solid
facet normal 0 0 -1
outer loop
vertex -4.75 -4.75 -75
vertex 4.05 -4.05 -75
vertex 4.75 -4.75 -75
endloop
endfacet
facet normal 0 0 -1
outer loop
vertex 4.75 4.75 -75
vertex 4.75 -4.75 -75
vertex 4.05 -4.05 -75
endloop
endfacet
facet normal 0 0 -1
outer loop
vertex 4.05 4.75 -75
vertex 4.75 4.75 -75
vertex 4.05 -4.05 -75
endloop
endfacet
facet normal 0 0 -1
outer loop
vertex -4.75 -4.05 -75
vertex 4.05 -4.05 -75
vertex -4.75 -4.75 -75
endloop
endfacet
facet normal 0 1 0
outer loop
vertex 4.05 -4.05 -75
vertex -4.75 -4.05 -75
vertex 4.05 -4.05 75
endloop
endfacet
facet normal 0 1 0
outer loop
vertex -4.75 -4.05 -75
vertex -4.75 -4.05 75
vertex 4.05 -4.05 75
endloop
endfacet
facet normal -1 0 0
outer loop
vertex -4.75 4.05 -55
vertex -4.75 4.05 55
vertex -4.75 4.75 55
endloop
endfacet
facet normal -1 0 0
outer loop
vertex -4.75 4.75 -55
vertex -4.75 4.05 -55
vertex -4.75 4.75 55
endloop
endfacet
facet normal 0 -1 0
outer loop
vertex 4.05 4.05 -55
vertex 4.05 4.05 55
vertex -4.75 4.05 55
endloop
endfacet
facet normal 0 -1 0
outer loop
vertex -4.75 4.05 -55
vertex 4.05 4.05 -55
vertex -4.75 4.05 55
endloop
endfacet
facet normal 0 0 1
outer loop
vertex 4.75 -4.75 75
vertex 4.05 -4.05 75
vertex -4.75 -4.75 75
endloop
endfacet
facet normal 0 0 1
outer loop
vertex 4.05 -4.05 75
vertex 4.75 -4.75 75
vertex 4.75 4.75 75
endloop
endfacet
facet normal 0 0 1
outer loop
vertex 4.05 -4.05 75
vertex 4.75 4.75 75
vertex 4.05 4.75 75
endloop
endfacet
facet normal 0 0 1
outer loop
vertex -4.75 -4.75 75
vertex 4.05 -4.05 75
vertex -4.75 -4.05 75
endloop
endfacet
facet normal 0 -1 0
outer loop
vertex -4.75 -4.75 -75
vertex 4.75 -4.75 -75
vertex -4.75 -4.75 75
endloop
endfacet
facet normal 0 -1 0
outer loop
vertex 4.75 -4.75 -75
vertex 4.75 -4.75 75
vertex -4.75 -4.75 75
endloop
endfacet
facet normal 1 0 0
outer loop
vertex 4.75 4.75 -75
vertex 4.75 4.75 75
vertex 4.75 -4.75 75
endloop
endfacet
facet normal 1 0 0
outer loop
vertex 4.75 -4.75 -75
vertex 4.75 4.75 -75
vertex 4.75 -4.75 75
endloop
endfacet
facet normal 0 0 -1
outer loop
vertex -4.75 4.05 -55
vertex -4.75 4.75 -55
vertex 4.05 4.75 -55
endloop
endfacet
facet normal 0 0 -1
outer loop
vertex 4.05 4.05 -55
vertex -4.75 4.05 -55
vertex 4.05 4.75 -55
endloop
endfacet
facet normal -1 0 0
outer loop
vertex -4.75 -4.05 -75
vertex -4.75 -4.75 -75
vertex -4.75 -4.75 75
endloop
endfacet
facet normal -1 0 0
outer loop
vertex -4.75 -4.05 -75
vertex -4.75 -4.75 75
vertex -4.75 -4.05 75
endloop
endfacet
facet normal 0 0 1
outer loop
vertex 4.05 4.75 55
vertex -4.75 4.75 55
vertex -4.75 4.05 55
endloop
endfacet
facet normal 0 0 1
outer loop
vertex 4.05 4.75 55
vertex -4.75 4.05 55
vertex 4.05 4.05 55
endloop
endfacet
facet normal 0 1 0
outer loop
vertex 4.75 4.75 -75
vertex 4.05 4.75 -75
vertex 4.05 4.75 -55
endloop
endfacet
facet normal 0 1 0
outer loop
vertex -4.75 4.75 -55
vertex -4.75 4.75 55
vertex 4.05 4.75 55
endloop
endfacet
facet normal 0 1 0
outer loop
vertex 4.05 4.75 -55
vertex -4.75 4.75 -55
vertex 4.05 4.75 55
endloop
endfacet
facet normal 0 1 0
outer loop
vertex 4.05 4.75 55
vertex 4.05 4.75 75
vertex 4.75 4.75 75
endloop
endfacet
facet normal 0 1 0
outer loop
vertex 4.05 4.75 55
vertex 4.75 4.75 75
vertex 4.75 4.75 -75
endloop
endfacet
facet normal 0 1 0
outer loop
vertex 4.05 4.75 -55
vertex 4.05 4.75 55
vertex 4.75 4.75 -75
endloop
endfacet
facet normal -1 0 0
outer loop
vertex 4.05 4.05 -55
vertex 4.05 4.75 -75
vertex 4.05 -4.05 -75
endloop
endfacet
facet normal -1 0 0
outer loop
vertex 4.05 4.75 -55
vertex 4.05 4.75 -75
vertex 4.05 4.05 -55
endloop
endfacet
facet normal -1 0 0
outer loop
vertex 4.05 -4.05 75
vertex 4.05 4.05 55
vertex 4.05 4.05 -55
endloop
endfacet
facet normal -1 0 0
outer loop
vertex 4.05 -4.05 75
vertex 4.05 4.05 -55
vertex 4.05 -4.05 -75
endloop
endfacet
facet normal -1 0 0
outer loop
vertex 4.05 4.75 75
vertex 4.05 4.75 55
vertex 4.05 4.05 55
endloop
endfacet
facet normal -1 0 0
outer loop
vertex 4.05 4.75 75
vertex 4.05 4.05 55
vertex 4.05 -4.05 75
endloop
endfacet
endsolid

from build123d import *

# Parameters (mm, degrees)
BOSS_EXTRUDE1_DEPTH = 75
SKETCH2_W           = 8.8
SKETCH2_H           = 20
CUT_EXTRUDE1_DEPTH  = 0.7


with BuildPart() as part:
    # Sketch1 → Boss-Extrude1 (new body, symmetric)
    with BuildSketch(Plane.XY):
        Polygon((4.75, 4.75), (4.75, -4.75), (-4.75, -4.75), (-4.75, -4.05), (4.05, -4.05), (4.05, 4.05), (-4.75, 4.05), (-4.75, 4.75), align=None)
    extrude(amount=BOSS_EXTRUDE1_DEPTH, both=True)

    # Sketch2 → Cut-Extrude1 (cut)
    with BuildSketch(Plane(origin=(0, 4.75, 0), x_dir=(1, 0, 0), z_dir=(0, 1, 0))):
        with Locations((-0.35, 65)):
            Rectangle(SKETCH2_W, SKETCH2_H)
    cut_extrude1 = extrude(amount=-CUT_EXTRUDE1_DEPTH, mode=Mode.SUBTRACT)

    # Mirror1: Cut-Extrude1 across plane
    add(cut_extrude1.mirror(Plane.XY), mode=Mode.SUBTRACT)


solid = part.part
